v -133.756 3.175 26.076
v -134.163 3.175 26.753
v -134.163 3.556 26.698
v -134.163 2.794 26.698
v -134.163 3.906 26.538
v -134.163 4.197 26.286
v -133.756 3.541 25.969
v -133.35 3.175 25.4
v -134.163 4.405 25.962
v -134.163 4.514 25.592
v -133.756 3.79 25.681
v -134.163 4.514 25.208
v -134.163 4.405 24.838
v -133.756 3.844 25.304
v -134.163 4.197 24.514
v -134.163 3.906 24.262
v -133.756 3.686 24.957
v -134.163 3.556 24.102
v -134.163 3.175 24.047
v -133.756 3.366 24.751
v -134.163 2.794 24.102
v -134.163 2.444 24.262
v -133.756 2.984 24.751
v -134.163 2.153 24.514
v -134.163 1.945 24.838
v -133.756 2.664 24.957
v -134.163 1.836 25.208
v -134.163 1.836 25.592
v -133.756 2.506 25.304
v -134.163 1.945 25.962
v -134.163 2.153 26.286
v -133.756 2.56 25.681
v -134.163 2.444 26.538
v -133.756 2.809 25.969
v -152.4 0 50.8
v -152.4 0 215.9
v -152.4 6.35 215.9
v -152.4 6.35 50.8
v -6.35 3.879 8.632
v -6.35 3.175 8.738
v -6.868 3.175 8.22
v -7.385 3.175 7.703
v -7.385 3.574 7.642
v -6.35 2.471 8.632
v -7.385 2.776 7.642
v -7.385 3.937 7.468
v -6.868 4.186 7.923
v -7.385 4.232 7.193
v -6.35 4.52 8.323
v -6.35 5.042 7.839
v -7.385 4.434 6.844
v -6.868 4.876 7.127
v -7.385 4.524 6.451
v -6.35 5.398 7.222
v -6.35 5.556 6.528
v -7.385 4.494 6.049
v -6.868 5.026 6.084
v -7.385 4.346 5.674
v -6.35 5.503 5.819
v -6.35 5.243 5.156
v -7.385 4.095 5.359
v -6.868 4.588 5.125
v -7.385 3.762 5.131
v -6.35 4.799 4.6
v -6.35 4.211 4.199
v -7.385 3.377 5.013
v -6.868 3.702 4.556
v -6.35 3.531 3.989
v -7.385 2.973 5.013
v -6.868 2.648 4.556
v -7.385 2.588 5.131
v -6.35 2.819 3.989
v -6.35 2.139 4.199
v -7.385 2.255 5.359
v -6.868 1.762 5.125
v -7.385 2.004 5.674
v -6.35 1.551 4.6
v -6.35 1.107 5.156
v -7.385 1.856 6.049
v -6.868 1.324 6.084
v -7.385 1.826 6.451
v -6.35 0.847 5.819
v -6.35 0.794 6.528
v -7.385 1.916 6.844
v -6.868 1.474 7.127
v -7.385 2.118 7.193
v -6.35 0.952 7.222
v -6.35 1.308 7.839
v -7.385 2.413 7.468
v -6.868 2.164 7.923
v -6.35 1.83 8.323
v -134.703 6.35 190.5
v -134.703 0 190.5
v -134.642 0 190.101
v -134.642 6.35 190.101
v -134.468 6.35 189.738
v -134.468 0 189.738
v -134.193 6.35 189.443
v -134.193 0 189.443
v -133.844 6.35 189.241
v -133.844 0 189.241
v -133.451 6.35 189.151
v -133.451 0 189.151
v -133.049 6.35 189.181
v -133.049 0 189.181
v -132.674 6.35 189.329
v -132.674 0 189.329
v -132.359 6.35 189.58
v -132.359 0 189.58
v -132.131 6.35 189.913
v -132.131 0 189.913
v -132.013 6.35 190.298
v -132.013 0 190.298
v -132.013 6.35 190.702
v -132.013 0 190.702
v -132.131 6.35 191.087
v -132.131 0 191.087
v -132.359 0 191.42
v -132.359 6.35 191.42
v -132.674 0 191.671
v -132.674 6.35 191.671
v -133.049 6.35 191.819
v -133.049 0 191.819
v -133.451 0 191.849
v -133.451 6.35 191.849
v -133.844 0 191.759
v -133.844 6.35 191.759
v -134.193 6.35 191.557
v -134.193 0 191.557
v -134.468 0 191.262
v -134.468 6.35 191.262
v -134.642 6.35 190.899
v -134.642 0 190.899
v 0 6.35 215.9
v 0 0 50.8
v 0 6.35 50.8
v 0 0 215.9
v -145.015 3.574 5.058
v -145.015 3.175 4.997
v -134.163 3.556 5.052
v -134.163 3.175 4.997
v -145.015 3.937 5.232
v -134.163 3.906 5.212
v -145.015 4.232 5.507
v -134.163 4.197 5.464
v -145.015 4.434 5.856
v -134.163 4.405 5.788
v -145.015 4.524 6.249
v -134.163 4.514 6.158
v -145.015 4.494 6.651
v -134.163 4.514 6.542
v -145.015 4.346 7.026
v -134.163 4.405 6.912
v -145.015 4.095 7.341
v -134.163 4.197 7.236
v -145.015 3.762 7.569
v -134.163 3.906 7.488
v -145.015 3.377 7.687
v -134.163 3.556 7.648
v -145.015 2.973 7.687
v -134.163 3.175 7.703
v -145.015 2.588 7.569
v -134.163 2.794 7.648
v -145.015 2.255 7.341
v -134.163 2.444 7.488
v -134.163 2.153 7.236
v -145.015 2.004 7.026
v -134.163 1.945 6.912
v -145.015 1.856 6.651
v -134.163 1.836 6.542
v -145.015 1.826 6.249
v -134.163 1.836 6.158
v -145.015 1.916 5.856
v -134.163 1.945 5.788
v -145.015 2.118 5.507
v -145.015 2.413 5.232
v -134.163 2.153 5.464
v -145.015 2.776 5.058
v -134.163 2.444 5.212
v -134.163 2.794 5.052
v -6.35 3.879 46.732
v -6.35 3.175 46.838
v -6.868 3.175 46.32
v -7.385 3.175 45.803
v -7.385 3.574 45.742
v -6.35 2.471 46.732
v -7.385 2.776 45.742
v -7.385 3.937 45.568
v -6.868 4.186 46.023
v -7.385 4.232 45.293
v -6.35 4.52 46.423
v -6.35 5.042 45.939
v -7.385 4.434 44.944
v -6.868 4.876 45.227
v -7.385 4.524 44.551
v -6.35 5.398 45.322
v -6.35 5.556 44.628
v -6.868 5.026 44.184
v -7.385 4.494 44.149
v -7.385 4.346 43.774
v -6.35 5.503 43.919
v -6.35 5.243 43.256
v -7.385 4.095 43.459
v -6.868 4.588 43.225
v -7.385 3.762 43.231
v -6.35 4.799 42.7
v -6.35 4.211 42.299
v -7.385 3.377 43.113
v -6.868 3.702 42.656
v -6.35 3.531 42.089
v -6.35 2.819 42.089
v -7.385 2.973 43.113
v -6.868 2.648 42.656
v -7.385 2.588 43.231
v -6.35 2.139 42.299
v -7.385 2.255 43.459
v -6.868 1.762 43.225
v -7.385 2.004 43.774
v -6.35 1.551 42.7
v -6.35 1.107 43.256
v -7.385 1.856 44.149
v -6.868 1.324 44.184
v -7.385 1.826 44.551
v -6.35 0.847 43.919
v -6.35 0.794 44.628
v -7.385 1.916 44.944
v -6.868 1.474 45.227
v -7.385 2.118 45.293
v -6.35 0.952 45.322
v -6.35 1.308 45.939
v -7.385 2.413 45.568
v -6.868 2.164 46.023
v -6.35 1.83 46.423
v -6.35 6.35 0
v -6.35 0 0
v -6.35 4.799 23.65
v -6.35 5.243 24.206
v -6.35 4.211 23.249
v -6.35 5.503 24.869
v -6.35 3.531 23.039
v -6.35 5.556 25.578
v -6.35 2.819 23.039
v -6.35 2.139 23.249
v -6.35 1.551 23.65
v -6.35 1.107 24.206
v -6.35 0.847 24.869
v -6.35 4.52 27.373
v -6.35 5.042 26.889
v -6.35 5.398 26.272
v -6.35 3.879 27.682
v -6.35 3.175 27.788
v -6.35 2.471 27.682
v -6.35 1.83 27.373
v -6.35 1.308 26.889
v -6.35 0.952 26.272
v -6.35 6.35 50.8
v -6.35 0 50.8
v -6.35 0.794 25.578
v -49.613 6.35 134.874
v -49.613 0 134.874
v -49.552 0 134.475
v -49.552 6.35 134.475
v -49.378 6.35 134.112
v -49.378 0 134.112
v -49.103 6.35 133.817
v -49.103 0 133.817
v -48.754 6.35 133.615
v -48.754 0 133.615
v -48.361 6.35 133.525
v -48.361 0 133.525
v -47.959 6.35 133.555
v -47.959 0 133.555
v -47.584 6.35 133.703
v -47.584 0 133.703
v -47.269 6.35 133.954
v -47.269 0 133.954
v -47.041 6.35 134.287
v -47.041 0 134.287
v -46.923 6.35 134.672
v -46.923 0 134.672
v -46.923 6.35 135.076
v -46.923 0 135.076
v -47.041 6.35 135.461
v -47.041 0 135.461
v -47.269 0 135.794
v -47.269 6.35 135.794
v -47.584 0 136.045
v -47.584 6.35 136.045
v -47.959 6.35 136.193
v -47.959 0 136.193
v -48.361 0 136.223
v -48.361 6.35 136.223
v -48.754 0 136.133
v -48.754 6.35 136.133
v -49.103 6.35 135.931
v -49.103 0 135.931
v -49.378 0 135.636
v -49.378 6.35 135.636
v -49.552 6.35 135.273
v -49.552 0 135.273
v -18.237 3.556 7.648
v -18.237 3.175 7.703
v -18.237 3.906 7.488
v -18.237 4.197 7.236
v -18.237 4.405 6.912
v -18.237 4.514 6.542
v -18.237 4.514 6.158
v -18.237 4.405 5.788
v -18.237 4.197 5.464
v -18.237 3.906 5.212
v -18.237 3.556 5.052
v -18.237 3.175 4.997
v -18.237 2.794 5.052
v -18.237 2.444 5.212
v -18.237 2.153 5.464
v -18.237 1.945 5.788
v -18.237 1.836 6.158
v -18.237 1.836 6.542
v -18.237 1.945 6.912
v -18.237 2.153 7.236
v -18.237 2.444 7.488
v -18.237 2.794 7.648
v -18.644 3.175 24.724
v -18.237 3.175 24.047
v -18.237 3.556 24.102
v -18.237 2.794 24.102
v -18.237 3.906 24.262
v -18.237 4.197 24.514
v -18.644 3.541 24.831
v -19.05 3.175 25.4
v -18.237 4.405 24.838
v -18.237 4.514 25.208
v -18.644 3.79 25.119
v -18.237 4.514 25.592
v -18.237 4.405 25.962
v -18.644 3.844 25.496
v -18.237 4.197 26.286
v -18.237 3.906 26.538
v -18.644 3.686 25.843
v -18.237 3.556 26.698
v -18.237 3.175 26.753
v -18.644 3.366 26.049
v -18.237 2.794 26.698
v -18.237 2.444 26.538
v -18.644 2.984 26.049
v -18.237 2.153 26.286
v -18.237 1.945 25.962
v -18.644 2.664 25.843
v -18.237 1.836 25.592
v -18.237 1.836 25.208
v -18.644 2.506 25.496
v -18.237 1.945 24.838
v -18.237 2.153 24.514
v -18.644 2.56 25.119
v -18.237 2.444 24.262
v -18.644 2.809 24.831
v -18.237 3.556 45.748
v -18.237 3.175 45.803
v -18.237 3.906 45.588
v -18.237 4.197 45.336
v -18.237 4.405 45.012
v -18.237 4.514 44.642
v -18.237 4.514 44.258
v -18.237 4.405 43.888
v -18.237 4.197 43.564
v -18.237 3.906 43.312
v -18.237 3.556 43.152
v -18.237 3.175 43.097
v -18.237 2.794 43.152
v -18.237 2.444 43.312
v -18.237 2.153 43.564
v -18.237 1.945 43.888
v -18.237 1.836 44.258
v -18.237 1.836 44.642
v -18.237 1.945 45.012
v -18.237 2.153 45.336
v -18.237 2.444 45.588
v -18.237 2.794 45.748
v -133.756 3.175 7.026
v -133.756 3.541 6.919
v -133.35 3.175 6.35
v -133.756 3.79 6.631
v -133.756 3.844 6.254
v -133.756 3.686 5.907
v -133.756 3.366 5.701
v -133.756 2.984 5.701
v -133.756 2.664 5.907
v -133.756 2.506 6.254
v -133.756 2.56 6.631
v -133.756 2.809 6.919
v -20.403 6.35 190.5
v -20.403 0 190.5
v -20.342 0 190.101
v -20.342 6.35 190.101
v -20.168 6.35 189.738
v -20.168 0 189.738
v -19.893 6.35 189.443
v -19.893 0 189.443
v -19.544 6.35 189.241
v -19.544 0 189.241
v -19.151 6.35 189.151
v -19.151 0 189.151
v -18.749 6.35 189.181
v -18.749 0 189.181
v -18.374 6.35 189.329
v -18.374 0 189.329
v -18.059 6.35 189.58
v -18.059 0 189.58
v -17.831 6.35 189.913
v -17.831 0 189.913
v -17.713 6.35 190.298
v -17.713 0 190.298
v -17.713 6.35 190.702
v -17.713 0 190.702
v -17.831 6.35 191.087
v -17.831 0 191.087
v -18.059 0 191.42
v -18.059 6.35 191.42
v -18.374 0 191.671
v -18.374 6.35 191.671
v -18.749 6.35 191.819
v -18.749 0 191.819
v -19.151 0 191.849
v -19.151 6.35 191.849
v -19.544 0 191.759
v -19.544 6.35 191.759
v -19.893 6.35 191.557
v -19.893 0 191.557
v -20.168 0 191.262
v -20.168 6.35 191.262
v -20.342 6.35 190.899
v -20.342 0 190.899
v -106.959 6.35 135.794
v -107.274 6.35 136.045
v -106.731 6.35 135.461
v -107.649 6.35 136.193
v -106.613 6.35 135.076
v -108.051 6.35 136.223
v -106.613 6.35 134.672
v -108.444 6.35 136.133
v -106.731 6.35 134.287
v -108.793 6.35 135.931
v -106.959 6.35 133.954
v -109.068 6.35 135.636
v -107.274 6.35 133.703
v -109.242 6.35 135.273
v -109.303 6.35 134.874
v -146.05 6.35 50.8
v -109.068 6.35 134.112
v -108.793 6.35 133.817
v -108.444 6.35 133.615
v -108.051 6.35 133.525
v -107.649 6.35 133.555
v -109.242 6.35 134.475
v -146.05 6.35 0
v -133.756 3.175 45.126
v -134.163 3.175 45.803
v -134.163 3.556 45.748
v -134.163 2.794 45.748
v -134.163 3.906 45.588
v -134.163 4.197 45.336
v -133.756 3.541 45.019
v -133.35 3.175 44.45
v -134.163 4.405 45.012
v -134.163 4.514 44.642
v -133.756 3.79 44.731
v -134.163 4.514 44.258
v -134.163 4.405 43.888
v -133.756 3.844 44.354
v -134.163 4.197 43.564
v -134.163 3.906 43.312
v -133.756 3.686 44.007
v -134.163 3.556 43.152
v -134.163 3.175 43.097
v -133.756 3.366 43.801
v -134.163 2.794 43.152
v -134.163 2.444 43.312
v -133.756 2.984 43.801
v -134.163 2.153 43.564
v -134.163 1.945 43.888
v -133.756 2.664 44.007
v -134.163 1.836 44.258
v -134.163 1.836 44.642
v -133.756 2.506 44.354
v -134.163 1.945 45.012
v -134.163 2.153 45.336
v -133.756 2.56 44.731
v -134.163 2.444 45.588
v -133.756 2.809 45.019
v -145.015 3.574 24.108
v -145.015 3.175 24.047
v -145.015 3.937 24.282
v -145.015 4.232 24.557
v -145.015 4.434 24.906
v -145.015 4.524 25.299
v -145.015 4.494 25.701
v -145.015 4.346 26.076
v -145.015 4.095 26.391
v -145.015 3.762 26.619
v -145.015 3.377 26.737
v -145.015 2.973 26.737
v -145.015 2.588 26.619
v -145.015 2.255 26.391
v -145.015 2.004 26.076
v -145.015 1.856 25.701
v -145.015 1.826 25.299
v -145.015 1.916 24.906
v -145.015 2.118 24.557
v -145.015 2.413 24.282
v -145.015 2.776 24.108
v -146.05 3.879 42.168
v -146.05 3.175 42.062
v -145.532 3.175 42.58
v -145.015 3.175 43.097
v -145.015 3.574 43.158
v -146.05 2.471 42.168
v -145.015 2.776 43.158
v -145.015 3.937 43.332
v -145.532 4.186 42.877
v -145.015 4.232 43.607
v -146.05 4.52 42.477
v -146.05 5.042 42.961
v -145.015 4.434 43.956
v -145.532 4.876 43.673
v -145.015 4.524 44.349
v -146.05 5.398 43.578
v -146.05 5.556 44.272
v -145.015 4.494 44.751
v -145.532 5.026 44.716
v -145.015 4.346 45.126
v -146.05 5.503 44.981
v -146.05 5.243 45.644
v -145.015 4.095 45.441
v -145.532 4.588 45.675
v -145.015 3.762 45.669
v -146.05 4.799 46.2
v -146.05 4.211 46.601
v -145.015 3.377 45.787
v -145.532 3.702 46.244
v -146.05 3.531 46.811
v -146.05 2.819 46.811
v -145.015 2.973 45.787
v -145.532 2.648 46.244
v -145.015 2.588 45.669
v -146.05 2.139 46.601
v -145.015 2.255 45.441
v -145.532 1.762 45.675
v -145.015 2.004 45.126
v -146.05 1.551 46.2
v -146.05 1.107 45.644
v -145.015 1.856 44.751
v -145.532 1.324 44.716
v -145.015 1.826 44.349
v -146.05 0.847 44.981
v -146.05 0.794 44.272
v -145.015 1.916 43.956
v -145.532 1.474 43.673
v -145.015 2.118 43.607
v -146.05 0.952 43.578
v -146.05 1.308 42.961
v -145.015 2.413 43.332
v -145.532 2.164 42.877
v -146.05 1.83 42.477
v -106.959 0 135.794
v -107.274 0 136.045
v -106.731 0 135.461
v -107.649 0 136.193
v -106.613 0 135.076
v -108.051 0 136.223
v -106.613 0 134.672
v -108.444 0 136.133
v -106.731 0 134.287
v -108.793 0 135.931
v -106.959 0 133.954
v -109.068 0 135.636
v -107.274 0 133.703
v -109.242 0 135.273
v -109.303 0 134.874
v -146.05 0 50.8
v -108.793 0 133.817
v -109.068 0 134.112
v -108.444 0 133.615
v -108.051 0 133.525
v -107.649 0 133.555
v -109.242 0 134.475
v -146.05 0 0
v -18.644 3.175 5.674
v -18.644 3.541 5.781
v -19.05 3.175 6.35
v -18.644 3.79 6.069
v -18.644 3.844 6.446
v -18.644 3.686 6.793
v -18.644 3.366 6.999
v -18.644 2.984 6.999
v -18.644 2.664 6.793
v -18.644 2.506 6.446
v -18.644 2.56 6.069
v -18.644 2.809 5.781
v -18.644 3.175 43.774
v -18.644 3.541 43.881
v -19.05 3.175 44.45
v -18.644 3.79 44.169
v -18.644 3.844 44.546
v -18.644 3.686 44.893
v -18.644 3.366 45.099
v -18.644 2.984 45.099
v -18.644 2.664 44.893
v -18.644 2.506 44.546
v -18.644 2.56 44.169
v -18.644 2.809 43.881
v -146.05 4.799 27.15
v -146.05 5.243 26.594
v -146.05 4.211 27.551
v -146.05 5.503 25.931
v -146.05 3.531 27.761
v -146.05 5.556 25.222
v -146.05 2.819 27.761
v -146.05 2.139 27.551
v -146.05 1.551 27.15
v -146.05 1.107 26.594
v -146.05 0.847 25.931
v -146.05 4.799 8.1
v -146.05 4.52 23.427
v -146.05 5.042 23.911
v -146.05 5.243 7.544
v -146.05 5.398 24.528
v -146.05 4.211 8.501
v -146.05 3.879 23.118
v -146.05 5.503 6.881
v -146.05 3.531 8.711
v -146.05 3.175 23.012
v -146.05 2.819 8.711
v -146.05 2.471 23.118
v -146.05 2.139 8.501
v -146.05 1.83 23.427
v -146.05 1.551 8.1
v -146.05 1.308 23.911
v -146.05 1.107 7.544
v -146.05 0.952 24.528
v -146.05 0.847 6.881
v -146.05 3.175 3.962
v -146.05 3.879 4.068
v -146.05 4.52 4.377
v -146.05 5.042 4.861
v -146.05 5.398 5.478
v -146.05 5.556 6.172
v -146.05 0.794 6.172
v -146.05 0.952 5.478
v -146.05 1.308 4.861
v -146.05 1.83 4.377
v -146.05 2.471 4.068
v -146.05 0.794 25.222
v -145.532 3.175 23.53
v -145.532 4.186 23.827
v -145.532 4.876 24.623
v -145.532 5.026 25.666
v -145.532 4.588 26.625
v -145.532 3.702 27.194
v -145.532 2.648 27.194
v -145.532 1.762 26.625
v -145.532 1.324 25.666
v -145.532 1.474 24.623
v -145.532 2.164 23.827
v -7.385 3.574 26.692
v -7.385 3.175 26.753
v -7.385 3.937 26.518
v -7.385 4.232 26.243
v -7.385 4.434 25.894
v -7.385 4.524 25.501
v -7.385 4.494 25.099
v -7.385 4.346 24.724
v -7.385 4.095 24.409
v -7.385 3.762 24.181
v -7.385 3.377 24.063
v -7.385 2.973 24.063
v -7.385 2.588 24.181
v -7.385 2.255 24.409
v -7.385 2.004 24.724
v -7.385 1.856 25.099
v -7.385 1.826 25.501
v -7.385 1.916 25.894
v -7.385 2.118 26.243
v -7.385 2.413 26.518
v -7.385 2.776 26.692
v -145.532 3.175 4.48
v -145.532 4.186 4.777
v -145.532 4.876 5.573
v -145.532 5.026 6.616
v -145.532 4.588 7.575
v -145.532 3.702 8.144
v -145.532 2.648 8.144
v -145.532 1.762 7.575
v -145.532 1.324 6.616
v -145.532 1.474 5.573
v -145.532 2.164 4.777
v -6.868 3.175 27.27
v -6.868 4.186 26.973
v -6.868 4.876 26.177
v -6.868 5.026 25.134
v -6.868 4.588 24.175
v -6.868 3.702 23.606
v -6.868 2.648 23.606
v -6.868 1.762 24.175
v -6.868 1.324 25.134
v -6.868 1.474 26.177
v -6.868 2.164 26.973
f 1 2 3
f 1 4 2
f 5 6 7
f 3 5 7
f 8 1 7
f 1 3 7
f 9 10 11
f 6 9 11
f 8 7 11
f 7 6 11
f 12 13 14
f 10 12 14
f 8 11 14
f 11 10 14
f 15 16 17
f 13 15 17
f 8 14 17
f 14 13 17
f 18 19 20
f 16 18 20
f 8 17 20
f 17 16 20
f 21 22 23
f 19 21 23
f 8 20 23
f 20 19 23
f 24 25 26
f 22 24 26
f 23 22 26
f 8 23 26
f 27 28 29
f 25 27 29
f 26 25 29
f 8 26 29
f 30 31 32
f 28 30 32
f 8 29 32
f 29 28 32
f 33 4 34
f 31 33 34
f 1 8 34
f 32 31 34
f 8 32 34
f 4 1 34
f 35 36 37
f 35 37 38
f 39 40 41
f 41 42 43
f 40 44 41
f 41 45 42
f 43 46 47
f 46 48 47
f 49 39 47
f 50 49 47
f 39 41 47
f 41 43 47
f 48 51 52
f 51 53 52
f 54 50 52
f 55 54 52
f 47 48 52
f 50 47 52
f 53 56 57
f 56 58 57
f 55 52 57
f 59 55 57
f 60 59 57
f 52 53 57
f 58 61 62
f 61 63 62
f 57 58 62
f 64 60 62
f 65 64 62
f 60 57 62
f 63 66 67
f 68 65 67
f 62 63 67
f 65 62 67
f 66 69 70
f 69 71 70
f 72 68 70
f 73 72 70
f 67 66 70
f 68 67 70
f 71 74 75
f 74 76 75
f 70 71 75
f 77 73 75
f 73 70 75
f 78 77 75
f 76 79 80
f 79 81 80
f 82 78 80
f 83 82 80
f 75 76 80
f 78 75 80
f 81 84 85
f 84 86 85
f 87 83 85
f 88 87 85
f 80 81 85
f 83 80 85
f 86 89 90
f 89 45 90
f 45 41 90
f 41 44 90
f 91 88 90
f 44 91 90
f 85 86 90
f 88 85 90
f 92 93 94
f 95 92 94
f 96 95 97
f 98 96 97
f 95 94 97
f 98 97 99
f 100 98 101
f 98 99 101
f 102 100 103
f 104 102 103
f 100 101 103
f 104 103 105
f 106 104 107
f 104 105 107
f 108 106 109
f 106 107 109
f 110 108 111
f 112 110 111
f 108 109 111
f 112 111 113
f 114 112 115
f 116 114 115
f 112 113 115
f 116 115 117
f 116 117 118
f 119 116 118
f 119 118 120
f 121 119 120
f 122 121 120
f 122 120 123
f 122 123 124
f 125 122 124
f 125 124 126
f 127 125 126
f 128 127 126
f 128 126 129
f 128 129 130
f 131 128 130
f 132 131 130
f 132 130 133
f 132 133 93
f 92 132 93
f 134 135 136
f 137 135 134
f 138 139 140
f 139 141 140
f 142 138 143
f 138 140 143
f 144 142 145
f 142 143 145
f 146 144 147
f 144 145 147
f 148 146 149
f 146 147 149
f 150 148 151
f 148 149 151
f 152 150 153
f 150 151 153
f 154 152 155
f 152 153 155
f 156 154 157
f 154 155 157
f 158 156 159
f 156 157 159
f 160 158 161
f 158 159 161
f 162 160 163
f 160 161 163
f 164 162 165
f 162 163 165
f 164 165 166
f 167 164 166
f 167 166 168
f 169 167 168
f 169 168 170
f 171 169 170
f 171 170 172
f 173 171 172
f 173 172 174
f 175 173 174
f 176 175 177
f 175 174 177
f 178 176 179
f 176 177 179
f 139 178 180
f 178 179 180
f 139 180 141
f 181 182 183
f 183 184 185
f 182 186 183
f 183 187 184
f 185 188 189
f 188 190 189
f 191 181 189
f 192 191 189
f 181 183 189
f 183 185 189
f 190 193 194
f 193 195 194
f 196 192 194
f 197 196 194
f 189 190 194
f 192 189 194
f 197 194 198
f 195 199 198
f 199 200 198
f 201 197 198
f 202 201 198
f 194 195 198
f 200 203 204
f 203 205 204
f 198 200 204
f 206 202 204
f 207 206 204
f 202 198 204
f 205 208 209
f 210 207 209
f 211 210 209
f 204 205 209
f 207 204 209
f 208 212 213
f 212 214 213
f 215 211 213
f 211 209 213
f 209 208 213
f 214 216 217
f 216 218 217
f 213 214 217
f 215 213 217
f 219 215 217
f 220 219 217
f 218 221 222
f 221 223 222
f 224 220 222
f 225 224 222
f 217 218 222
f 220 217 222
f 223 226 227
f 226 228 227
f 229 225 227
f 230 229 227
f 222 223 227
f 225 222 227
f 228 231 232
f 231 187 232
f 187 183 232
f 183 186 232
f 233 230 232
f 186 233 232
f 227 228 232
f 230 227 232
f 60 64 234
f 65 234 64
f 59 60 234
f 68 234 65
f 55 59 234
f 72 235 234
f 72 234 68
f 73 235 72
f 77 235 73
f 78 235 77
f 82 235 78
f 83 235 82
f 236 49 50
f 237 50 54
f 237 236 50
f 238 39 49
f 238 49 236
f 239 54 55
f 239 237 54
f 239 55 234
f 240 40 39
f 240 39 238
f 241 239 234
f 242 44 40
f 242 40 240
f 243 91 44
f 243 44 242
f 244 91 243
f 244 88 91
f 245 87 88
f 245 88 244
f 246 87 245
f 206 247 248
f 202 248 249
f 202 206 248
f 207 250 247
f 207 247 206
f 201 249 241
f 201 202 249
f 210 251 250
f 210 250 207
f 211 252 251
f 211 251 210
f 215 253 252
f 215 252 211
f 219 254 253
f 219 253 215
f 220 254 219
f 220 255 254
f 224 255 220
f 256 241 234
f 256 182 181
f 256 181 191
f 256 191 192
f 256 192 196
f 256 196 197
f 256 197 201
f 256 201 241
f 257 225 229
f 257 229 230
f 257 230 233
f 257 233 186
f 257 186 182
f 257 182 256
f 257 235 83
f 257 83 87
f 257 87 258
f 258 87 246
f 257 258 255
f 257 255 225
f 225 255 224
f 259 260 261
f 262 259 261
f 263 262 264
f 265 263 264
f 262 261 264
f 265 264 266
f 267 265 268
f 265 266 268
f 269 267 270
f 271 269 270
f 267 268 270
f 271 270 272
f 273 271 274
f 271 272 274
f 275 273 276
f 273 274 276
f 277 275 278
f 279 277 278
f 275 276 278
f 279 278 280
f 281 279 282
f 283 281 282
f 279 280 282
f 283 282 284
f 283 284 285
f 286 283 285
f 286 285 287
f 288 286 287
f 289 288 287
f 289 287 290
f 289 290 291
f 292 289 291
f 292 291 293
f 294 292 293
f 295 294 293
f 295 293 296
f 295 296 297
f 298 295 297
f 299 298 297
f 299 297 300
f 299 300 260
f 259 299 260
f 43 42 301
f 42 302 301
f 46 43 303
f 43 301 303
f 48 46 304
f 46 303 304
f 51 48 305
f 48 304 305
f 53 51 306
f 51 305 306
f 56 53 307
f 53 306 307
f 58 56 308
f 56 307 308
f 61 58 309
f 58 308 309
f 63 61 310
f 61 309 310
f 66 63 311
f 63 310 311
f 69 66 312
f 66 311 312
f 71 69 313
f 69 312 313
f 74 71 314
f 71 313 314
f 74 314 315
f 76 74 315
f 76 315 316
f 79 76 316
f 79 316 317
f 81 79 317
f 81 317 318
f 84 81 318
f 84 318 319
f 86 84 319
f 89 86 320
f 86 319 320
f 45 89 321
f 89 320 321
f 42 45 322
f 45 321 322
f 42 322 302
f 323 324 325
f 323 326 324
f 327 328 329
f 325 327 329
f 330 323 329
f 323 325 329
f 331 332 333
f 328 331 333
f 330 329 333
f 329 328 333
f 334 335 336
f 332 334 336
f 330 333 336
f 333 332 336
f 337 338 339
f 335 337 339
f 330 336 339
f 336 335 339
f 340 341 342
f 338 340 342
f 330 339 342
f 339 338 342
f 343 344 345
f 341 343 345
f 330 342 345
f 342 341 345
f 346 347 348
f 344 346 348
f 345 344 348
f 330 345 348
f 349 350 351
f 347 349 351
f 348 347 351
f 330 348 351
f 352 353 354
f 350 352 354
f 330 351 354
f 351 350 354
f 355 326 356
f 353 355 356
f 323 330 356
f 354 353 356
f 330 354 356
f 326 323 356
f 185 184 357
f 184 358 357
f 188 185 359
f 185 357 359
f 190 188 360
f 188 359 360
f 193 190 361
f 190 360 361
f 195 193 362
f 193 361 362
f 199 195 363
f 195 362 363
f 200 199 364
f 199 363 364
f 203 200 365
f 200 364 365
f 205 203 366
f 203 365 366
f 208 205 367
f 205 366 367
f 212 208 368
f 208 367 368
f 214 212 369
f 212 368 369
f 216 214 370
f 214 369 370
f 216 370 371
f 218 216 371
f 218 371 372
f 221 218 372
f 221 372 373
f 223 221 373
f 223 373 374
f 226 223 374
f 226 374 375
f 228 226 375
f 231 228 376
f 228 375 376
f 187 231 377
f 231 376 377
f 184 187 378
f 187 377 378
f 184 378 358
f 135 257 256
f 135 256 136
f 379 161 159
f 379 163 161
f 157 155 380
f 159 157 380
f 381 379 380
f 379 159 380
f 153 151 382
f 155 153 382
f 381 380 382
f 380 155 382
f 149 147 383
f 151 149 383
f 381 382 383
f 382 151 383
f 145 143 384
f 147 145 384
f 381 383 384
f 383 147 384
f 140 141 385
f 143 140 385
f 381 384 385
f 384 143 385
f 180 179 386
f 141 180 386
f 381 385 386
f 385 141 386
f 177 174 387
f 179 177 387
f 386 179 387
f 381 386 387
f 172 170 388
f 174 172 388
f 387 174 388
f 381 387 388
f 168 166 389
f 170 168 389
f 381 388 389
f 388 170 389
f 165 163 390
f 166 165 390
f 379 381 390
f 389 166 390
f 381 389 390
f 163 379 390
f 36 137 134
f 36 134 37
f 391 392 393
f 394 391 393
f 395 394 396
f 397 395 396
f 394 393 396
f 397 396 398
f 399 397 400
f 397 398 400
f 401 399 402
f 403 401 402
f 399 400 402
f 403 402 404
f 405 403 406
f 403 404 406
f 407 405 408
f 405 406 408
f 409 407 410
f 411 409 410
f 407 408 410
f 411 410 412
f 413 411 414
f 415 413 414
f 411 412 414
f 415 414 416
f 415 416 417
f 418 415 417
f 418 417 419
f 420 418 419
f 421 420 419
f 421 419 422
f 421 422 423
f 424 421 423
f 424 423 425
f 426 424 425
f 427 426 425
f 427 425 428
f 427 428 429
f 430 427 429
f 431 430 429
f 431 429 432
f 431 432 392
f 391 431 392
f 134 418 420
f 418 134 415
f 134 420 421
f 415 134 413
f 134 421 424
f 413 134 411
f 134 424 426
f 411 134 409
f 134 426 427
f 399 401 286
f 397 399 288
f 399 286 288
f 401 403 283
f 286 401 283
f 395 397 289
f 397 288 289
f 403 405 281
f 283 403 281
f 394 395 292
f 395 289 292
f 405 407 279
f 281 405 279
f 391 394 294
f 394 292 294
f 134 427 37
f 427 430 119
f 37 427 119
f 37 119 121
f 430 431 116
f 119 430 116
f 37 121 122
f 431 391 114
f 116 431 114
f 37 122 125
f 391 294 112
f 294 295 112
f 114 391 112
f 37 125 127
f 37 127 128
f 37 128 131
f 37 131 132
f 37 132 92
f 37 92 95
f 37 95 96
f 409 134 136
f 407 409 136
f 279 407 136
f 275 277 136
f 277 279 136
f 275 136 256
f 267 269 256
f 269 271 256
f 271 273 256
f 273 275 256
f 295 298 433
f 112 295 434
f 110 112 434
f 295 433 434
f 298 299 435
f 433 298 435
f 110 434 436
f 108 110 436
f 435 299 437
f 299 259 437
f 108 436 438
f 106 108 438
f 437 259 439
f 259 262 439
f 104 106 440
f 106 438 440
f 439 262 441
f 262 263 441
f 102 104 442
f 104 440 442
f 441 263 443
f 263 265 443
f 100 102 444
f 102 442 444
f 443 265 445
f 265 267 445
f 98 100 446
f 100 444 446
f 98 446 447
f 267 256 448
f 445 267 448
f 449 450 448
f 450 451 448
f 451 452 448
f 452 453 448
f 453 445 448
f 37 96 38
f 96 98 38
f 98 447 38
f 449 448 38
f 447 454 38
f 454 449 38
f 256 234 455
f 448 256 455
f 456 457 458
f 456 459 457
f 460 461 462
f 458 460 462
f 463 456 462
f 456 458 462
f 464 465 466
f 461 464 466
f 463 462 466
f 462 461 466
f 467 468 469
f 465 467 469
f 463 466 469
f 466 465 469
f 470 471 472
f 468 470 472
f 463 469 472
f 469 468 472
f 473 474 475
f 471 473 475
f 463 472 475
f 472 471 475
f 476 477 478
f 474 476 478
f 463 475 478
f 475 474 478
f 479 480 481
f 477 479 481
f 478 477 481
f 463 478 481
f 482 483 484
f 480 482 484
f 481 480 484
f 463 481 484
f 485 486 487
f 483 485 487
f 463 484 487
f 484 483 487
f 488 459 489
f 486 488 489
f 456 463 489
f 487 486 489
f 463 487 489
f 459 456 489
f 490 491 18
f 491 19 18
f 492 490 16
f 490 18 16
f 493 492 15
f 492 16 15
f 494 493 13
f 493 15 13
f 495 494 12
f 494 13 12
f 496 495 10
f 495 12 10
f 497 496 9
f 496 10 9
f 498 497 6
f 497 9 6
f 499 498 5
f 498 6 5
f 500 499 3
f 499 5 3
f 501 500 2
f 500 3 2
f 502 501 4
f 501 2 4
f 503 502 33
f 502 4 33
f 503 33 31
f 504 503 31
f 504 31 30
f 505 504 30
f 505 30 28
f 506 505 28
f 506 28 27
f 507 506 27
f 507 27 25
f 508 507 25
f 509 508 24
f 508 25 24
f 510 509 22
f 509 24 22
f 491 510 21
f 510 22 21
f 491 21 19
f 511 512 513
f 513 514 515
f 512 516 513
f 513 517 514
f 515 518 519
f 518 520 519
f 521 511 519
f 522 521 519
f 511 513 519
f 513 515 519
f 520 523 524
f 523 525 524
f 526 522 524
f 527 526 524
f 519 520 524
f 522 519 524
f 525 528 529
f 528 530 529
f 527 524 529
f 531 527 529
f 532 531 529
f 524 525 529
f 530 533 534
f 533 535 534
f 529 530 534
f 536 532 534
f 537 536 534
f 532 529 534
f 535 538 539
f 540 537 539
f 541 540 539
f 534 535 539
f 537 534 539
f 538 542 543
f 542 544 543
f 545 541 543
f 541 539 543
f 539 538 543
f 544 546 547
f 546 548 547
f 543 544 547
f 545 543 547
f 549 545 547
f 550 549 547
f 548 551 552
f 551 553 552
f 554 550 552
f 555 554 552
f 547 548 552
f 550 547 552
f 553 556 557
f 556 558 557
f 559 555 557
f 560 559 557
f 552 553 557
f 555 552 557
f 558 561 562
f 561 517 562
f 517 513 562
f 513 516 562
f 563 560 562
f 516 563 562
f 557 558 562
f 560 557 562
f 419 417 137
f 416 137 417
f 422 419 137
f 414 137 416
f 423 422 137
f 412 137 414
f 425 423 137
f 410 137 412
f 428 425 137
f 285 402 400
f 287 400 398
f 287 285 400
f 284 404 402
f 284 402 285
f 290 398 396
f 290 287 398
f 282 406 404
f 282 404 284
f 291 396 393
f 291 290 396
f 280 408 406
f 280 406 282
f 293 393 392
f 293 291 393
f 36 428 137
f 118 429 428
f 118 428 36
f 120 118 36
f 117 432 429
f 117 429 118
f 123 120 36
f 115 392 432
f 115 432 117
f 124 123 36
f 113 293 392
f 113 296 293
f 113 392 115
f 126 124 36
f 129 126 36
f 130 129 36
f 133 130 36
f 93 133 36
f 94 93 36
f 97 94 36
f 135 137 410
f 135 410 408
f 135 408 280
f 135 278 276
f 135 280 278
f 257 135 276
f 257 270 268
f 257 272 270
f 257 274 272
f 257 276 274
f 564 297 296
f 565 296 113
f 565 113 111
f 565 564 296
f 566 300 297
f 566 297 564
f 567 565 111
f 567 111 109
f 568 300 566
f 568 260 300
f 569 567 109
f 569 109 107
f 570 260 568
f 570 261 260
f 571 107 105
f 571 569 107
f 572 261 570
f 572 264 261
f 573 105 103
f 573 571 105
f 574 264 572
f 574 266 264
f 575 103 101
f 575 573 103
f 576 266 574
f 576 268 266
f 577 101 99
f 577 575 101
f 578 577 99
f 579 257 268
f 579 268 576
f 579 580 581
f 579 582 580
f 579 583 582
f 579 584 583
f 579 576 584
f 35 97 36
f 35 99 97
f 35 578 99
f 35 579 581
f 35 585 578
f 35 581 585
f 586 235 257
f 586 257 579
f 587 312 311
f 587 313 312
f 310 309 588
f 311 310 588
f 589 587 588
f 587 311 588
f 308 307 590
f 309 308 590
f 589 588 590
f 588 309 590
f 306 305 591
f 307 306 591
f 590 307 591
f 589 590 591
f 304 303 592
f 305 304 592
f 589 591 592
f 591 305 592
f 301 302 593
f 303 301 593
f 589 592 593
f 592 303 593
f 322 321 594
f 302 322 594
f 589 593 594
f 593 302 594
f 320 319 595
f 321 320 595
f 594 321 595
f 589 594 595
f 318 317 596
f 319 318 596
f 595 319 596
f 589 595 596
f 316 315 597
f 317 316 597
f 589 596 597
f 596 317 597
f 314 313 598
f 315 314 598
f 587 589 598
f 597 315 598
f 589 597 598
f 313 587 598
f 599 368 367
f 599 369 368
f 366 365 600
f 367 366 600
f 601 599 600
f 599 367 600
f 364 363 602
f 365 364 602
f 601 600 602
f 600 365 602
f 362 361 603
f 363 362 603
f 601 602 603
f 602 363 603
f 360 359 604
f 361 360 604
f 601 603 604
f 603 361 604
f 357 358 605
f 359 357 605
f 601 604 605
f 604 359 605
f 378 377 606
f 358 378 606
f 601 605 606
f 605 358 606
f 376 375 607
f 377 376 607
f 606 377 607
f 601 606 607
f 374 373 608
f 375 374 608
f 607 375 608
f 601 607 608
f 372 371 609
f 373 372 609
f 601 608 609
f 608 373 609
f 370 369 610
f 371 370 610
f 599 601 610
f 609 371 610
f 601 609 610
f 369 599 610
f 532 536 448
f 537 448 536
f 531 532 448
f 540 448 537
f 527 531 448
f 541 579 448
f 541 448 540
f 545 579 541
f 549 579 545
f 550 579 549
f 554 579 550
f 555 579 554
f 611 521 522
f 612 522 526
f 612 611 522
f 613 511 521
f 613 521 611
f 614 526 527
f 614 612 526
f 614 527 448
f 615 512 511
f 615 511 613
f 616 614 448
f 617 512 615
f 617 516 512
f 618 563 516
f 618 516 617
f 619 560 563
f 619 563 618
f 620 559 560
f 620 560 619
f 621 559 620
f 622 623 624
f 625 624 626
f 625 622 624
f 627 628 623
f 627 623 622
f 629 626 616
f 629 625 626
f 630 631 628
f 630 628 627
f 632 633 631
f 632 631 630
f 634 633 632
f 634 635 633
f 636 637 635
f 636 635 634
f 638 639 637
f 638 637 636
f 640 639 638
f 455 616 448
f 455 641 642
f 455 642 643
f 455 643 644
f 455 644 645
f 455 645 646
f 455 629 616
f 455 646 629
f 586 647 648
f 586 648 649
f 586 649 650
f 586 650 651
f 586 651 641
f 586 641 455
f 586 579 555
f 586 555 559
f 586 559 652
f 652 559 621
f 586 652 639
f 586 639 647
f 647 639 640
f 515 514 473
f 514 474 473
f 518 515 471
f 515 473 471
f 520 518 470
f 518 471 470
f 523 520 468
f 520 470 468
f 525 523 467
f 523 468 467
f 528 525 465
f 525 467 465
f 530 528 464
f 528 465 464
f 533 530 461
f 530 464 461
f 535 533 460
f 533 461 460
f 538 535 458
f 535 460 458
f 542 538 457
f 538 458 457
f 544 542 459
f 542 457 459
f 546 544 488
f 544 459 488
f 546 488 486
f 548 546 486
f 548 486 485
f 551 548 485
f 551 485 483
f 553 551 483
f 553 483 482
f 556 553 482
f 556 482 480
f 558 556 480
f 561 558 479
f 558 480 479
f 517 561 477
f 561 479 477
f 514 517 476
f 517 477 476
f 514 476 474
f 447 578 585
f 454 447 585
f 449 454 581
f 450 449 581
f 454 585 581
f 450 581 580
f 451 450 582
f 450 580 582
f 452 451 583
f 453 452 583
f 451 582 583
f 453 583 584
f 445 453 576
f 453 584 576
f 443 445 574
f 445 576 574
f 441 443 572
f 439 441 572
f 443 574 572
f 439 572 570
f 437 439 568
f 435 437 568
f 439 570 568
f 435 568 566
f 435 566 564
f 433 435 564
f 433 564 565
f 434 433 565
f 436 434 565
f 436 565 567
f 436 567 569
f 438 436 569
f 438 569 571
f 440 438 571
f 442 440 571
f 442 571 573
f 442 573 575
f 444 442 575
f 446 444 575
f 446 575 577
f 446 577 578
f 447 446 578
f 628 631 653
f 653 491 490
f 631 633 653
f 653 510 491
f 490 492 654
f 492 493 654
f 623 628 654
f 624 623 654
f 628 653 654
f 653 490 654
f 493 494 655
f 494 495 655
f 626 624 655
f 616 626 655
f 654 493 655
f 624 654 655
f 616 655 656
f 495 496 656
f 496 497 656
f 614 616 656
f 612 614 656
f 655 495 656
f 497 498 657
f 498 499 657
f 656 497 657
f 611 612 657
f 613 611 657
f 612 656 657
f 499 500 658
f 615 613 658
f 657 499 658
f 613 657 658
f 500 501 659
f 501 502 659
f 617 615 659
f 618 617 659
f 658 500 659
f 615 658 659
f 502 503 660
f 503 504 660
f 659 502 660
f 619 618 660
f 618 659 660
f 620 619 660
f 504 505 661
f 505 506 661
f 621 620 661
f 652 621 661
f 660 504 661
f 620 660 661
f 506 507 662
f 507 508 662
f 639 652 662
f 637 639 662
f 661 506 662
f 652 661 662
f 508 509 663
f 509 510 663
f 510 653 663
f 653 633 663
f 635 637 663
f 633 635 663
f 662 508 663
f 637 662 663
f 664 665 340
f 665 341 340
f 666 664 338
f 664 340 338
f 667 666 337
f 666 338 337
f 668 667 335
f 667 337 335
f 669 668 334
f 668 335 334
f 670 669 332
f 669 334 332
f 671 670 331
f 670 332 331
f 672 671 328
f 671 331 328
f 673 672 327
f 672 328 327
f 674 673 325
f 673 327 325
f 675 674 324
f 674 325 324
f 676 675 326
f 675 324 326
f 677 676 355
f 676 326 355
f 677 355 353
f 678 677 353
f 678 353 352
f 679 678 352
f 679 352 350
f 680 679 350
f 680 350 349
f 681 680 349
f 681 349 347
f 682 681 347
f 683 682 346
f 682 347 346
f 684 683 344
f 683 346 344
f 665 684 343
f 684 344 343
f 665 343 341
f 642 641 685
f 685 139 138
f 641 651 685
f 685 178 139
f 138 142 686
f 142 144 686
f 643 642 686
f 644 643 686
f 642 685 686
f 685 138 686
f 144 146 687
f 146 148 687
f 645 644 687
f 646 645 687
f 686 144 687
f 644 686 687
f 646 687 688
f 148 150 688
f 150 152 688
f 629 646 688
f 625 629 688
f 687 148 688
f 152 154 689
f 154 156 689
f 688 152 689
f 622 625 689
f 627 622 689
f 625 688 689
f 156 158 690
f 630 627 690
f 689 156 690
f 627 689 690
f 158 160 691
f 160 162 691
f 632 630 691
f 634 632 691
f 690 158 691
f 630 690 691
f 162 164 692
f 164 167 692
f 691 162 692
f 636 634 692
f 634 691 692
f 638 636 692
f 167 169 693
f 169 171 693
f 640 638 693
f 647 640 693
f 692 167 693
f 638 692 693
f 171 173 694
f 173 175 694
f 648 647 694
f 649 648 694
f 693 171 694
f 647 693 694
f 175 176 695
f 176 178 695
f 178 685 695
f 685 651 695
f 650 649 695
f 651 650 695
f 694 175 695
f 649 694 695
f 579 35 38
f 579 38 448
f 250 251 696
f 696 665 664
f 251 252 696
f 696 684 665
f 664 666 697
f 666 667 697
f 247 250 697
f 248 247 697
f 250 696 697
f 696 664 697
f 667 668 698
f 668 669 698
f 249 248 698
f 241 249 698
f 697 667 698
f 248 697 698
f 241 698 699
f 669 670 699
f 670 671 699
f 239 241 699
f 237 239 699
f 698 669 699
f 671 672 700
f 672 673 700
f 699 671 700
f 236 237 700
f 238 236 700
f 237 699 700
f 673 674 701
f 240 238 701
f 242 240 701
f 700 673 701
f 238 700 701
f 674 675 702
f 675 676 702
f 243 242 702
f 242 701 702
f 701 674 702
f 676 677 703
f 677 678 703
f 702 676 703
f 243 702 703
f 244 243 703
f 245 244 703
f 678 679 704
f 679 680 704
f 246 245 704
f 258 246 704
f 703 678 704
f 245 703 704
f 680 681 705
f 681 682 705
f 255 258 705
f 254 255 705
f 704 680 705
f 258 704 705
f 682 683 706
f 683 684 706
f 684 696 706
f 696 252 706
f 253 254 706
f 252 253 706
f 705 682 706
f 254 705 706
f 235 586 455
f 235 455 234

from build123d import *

# Parameters (mm, degrees)
BOSS_EXTRUDE1_DEPTH             = 6.35
F_6_32_TAPPED_HOLE1_D           = 2.7051
F_6_32_TAPPED_HOLE1_DEPTH       = 11.88730597
F_6_32_TAPPED_HOLE1_CSINK_D     = 4.7752
F_6_32_TAPPED_HOLE1_CSINK_ANGLE = 90
F_6_32_TAPPED_HOLE1_TIP         = 0.81269403
F_6_32_TAPPED_HOLE2_D           = 2.7051
F_6_32_TAPPED_HOLE2_DEPTH       = 11.88730597
F_6_32_TAPPED_HOLE2_CSINK_D     = 4.7752
F_6_32_TAPPED_HOLE2_CSINK_ANGLE = 90
F_6_32_TAPPED_HOLE2_TIP         = 0.81269403
F_6_32_TAPPED_HOLE3_D           = 2.7051
F_6_32_TAPPED_HOLE4_D           = 2.7051


with BuildPart() as part:
    # Sketch1 → Boss-Extrude1 (new body)
    with BuildSketch(Plane(origin=(0, 0, 0), x_dir=(1, 0, 0), z_dir=(0, 1, 0))):
        Polygon((-6.35, 0), (-6.35, -50.8), (0, -50.8), (0, -215.9), (-152.4, -215.9), (-152.4, -50.8), (-146.05, -50.8), (-146.05, 0), align=None)
    extrude(amount=BOSS_EXTRUDE1_DEPTH)

    # #6-32 Tapped Hole1
    with Locations(Plane(origin=(-6.35, 0, 0), x_dir=(0, 0, -1), z_dir=(1, 0, 0))):
        with Locations((-44.45, 3.175), (-25.4, 3.175), (-6.35, 3.175)):
            CounterSinkHole(F_6_32_TAPPED_HOLE1_D / 2, F_6_32_TAPPED_HOLE1_CSINK_D / 2, depth=F_6_32_TAPPED_HOLE1_DEPTH, counter_sink_angle=F_6_32_TAPPED_HOLE1_CSINK_ANGLE)
            with Locations((0, 0, -(F_6_32_TAPPED_HOLE1_DEPTH + F_6_32_TAPPED_HOLE1_TIP / 2))):  # 118° drill point
                Cone(0, F_6_32_TAPPED_HOLE1_D / 2, F_6_32_TAPPED_HOLE1_TIP, mode=Mode.SUBTRACT)

    # #6-32 Tapped Hole2
    with Locations(Plane.ZY.offset(146.05)):
        with Locations((6.35, 3.175), (25.4, 3.175), (44.45, 3.175)):
            CounterSinkHole(F_6_32_TAPPED_HOLE2_D / 2, F_6_32_TAPPED_HOLE2_CSINK_D / 2, depth=F_6_32_TAPPED_HOLE2_DEPTH, counter_sink_angle=F_6_32_TAPPED_HOLE2_CSINK_ANGLE)
            with Locations((0, 0, -(F_6_32_TAPPED_HOLE2_DEPTH + F_6_32_TAPPED_HOLE2_TIP / 2))):  # 118° drill point
                Cone(0, F_6_32_TAPPED_HOLE2_D / 2, F_6_32_TAPPED_HOLE2_TIP, mode=Mode.SUBTRACT)

    # #6-32 Tapped Hole3 (through all)
    with Locations(Plane(origin=(0, 6.35, 0), x_dir=(1, 0, 0), z_dir=(0, 1, 0))):
        with Locations((-133.35, -190.5), (-19.05, -190.5)):
            Hole(F_6_32_TAPPED_HOLE3_D / 2)

    # #6-32 Tapped Hole4 (through all)
    with Locations(Plane(origin=(0, 6.35, 0), x_dir=(1, 0, 0), z_dir=(0, 1, 0))):
        with Locations((-107.95, -134.874), (-48.26, -134.874)):
            Hole(F_6_32_TAPPED_HOLE4_D / 2)


solid = part.part
